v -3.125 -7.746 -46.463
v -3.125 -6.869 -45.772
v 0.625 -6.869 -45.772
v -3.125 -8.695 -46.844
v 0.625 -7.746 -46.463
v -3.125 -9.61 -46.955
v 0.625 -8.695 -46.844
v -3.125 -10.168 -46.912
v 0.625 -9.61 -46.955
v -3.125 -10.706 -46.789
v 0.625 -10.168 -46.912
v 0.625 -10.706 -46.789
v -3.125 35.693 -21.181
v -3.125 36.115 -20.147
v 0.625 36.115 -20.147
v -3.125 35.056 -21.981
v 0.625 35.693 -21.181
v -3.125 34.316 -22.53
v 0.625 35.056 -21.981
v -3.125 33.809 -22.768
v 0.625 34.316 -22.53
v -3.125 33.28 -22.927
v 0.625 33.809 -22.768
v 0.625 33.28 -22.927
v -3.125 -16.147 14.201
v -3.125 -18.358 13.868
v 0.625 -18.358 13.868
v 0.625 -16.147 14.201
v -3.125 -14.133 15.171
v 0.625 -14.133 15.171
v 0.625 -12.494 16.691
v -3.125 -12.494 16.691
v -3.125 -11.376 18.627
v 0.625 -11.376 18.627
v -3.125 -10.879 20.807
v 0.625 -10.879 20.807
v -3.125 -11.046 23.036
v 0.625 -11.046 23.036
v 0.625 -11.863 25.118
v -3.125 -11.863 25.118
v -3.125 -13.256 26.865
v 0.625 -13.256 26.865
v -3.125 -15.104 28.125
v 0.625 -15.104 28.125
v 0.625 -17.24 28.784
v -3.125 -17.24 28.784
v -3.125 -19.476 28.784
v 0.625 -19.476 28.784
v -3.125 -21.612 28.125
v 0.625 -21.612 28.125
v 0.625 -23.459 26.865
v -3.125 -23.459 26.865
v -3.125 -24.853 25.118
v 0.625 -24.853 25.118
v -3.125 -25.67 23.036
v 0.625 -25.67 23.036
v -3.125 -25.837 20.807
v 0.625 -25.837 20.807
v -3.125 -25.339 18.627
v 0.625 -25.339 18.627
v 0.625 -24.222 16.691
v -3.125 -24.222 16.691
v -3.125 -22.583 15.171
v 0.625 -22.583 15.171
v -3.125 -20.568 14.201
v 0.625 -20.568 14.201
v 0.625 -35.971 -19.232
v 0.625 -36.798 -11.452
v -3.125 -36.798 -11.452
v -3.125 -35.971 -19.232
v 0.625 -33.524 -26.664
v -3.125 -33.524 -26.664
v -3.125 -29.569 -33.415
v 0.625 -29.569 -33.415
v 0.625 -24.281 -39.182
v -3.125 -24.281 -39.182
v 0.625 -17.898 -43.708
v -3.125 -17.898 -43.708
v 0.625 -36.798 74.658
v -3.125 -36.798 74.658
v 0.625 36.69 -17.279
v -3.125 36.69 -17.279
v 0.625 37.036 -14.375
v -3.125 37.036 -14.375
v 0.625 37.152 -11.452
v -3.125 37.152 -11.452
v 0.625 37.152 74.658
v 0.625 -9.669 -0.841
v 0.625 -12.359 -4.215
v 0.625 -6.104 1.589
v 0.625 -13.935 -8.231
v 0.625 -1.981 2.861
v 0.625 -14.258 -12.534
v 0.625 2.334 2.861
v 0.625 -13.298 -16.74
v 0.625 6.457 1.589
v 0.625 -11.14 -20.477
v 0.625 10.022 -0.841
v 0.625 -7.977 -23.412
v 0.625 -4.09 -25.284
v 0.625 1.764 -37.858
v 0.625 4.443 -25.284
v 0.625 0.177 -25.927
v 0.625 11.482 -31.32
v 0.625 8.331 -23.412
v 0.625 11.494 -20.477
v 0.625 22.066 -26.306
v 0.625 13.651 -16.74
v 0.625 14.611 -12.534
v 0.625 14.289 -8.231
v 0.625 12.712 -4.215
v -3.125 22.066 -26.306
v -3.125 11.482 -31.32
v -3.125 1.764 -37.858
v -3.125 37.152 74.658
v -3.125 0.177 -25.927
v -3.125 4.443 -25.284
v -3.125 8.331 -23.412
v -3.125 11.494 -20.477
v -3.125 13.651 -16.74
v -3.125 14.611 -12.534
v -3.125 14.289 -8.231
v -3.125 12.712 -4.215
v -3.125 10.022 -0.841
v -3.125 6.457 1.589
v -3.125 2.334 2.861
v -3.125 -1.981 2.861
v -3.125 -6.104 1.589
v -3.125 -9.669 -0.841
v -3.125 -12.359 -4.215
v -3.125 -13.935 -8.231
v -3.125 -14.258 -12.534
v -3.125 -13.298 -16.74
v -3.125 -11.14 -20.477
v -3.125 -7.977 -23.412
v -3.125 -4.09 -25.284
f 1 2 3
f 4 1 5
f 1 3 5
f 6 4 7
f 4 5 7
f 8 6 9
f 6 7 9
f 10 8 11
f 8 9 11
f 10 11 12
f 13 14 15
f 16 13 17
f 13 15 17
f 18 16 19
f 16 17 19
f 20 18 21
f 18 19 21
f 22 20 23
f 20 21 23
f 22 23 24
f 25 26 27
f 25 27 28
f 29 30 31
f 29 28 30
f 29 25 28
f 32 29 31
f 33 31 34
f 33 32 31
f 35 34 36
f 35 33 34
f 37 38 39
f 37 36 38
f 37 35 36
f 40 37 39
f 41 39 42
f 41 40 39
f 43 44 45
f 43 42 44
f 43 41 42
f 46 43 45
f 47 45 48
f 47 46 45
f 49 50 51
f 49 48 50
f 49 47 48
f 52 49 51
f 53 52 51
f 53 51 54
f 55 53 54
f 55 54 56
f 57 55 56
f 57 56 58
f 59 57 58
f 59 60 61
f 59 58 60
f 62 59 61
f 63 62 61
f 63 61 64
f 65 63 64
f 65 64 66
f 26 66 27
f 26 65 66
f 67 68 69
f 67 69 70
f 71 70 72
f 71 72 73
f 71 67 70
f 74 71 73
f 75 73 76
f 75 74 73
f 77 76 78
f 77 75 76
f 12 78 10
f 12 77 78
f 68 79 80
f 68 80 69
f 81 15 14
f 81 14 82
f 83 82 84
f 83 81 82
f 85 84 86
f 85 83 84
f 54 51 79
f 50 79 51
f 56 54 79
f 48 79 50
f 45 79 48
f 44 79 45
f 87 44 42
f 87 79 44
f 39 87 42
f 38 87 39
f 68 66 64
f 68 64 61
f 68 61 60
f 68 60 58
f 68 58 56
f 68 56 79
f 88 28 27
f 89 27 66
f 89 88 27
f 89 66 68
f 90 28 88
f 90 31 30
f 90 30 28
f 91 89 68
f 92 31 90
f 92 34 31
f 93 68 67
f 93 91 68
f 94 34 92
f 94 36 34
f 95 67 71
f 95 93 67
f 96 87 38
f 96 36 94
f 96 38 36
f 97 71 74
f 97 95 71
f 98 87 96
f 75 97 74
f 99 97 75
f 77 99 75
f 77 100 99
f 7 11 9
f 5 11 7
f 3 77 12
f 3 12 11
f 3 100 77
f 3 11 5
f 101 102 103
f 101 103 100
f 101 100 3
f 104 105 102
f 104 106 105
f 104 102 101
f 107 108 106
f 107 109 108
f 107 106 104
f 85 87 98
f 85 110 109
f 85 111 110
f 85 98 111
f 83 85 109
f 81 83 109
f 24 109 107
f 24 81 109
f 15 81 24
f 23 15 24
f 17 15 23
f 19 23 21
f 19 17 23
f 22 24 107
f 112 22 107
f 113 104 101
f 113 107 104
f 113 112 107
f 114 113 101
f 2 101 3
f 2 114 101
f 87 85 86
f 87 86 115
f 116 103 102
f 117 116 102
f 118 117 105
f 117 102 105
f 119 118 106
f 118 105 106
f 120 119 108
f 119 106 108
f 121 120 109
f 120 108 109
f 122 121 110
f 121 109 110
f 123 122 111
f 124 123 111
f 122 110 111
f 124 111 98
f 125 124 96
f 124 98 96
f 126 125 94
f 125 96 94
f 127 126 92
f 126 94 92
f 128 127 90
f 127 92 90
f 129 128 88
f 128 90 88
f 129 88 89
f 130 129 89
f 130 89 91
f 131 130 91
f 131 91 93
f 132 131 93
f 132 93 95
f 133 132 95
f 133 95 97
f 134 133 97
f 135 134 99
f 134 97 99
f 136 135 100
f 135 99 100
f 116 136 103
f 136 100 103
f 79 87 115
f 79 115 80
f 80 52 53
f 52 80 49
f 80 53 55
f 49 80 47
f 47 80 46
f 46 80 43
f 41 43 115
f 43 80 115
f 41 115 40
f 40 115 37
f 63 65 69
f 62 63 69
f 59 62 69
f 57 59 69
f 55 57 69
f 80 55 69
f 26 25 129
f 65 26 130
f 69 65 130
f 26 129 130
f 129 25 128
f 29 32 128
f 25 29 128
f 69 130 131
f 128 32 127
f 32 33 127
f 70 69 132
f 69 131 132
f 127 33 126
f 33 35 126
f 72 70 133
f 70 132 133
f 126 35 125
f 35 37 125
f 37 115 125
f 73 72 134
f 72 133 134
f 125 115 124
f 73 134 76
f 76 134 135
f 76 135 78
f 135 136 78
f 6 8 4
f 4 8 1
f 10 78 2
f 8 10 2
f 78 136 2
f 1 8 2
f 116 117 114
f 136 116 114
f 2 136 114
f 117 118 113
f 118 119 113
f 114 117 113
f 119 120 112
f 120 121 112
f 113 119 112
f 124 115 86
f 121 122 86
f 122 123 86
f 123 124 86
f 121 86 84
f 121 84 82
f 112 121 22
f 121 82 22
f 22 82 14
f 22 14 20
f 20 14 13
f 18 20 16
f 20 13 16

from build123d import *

# Parameters (mm, degrees)
SKETCH1_R               = 9.65
BASE_FLANGE1_DEPTH      = 2.5
CUT_EXTRUDE1_DEPTH      = 63.525520722
CUT_EXTRUDE1_DEPTH_BACK = 63.525520722
SKETCH2_R               = 5
SKETCH2_R_2             = 52.175
FILLET1_R               = 2.5
SCALE1_SCALE            = 1.5


# Sheet-metal steps are written as plain solids
with BuildPart() as part:
    # Sketch1 → Base-Flange1 (new body)
    with BuildSketch(Plane(origin=(0, 0, 0), x_dir=(0, 0, -1), z_dir=(1, 0, 0))):
        with BuildLine():
            Line((0, 24.65), (-57.40704, 24.65))
            Line((-57.40704, 24.65), (-57.40704, -24.65))
            Line((-57.40704, -24.65), (0, -24.65))
            ThreePointArc((0, -24.65), (24.65, 0), (0, 24.65))
        make_face()
        Circle(SKETCH1_R, mode=Mode.SUBTRACT)
    extrude(amount=-BASE_FLANGE1_DEPTH)

    # Sketch2 → Cut-Extrude1 (cut, two sides: drawn at the far end of the back side and taken through both)
    with BuildSketch(Plane(origin=(0, 0, 0), x_dir=(0, 0, -1), z_dir=(1, 0, 0)).offset(-CUT_EXTRUDE1_DEPTH_BACK)):
        with Locations((-21.8797706, -12.3562513)):
            Circle(SKETCH2_R)
        with Locations((58.59296, 33.3400694)):
            Circle(SKETCH2_R_2)
    extrude(amount=CUT_EXTRUDE1_DEPTH + CUT_EXTRUDE1_DEPTH_BACK, mode=Mode.SUBTRACT)

    # Fillet1
    fillet1_edges = [part.edges().sort_by_distance(p)[0] for p in [
        (-1.25, 23.529116974, -7.348683856),
        (-1.25, -5.701899087, -23.981468821),
    ]]
    fillet(fillet1_edges, radius=FILLET1_R)


with BuildPart() as part_1:
    # Scale1: scaled about (-1.25, -0.353186923, 22.904210984)
    add(part.part.scale(SCALE1_SCALE).moved(Location((0.625, 0.176593461, -11.452105492))))


solid = part_1.part
